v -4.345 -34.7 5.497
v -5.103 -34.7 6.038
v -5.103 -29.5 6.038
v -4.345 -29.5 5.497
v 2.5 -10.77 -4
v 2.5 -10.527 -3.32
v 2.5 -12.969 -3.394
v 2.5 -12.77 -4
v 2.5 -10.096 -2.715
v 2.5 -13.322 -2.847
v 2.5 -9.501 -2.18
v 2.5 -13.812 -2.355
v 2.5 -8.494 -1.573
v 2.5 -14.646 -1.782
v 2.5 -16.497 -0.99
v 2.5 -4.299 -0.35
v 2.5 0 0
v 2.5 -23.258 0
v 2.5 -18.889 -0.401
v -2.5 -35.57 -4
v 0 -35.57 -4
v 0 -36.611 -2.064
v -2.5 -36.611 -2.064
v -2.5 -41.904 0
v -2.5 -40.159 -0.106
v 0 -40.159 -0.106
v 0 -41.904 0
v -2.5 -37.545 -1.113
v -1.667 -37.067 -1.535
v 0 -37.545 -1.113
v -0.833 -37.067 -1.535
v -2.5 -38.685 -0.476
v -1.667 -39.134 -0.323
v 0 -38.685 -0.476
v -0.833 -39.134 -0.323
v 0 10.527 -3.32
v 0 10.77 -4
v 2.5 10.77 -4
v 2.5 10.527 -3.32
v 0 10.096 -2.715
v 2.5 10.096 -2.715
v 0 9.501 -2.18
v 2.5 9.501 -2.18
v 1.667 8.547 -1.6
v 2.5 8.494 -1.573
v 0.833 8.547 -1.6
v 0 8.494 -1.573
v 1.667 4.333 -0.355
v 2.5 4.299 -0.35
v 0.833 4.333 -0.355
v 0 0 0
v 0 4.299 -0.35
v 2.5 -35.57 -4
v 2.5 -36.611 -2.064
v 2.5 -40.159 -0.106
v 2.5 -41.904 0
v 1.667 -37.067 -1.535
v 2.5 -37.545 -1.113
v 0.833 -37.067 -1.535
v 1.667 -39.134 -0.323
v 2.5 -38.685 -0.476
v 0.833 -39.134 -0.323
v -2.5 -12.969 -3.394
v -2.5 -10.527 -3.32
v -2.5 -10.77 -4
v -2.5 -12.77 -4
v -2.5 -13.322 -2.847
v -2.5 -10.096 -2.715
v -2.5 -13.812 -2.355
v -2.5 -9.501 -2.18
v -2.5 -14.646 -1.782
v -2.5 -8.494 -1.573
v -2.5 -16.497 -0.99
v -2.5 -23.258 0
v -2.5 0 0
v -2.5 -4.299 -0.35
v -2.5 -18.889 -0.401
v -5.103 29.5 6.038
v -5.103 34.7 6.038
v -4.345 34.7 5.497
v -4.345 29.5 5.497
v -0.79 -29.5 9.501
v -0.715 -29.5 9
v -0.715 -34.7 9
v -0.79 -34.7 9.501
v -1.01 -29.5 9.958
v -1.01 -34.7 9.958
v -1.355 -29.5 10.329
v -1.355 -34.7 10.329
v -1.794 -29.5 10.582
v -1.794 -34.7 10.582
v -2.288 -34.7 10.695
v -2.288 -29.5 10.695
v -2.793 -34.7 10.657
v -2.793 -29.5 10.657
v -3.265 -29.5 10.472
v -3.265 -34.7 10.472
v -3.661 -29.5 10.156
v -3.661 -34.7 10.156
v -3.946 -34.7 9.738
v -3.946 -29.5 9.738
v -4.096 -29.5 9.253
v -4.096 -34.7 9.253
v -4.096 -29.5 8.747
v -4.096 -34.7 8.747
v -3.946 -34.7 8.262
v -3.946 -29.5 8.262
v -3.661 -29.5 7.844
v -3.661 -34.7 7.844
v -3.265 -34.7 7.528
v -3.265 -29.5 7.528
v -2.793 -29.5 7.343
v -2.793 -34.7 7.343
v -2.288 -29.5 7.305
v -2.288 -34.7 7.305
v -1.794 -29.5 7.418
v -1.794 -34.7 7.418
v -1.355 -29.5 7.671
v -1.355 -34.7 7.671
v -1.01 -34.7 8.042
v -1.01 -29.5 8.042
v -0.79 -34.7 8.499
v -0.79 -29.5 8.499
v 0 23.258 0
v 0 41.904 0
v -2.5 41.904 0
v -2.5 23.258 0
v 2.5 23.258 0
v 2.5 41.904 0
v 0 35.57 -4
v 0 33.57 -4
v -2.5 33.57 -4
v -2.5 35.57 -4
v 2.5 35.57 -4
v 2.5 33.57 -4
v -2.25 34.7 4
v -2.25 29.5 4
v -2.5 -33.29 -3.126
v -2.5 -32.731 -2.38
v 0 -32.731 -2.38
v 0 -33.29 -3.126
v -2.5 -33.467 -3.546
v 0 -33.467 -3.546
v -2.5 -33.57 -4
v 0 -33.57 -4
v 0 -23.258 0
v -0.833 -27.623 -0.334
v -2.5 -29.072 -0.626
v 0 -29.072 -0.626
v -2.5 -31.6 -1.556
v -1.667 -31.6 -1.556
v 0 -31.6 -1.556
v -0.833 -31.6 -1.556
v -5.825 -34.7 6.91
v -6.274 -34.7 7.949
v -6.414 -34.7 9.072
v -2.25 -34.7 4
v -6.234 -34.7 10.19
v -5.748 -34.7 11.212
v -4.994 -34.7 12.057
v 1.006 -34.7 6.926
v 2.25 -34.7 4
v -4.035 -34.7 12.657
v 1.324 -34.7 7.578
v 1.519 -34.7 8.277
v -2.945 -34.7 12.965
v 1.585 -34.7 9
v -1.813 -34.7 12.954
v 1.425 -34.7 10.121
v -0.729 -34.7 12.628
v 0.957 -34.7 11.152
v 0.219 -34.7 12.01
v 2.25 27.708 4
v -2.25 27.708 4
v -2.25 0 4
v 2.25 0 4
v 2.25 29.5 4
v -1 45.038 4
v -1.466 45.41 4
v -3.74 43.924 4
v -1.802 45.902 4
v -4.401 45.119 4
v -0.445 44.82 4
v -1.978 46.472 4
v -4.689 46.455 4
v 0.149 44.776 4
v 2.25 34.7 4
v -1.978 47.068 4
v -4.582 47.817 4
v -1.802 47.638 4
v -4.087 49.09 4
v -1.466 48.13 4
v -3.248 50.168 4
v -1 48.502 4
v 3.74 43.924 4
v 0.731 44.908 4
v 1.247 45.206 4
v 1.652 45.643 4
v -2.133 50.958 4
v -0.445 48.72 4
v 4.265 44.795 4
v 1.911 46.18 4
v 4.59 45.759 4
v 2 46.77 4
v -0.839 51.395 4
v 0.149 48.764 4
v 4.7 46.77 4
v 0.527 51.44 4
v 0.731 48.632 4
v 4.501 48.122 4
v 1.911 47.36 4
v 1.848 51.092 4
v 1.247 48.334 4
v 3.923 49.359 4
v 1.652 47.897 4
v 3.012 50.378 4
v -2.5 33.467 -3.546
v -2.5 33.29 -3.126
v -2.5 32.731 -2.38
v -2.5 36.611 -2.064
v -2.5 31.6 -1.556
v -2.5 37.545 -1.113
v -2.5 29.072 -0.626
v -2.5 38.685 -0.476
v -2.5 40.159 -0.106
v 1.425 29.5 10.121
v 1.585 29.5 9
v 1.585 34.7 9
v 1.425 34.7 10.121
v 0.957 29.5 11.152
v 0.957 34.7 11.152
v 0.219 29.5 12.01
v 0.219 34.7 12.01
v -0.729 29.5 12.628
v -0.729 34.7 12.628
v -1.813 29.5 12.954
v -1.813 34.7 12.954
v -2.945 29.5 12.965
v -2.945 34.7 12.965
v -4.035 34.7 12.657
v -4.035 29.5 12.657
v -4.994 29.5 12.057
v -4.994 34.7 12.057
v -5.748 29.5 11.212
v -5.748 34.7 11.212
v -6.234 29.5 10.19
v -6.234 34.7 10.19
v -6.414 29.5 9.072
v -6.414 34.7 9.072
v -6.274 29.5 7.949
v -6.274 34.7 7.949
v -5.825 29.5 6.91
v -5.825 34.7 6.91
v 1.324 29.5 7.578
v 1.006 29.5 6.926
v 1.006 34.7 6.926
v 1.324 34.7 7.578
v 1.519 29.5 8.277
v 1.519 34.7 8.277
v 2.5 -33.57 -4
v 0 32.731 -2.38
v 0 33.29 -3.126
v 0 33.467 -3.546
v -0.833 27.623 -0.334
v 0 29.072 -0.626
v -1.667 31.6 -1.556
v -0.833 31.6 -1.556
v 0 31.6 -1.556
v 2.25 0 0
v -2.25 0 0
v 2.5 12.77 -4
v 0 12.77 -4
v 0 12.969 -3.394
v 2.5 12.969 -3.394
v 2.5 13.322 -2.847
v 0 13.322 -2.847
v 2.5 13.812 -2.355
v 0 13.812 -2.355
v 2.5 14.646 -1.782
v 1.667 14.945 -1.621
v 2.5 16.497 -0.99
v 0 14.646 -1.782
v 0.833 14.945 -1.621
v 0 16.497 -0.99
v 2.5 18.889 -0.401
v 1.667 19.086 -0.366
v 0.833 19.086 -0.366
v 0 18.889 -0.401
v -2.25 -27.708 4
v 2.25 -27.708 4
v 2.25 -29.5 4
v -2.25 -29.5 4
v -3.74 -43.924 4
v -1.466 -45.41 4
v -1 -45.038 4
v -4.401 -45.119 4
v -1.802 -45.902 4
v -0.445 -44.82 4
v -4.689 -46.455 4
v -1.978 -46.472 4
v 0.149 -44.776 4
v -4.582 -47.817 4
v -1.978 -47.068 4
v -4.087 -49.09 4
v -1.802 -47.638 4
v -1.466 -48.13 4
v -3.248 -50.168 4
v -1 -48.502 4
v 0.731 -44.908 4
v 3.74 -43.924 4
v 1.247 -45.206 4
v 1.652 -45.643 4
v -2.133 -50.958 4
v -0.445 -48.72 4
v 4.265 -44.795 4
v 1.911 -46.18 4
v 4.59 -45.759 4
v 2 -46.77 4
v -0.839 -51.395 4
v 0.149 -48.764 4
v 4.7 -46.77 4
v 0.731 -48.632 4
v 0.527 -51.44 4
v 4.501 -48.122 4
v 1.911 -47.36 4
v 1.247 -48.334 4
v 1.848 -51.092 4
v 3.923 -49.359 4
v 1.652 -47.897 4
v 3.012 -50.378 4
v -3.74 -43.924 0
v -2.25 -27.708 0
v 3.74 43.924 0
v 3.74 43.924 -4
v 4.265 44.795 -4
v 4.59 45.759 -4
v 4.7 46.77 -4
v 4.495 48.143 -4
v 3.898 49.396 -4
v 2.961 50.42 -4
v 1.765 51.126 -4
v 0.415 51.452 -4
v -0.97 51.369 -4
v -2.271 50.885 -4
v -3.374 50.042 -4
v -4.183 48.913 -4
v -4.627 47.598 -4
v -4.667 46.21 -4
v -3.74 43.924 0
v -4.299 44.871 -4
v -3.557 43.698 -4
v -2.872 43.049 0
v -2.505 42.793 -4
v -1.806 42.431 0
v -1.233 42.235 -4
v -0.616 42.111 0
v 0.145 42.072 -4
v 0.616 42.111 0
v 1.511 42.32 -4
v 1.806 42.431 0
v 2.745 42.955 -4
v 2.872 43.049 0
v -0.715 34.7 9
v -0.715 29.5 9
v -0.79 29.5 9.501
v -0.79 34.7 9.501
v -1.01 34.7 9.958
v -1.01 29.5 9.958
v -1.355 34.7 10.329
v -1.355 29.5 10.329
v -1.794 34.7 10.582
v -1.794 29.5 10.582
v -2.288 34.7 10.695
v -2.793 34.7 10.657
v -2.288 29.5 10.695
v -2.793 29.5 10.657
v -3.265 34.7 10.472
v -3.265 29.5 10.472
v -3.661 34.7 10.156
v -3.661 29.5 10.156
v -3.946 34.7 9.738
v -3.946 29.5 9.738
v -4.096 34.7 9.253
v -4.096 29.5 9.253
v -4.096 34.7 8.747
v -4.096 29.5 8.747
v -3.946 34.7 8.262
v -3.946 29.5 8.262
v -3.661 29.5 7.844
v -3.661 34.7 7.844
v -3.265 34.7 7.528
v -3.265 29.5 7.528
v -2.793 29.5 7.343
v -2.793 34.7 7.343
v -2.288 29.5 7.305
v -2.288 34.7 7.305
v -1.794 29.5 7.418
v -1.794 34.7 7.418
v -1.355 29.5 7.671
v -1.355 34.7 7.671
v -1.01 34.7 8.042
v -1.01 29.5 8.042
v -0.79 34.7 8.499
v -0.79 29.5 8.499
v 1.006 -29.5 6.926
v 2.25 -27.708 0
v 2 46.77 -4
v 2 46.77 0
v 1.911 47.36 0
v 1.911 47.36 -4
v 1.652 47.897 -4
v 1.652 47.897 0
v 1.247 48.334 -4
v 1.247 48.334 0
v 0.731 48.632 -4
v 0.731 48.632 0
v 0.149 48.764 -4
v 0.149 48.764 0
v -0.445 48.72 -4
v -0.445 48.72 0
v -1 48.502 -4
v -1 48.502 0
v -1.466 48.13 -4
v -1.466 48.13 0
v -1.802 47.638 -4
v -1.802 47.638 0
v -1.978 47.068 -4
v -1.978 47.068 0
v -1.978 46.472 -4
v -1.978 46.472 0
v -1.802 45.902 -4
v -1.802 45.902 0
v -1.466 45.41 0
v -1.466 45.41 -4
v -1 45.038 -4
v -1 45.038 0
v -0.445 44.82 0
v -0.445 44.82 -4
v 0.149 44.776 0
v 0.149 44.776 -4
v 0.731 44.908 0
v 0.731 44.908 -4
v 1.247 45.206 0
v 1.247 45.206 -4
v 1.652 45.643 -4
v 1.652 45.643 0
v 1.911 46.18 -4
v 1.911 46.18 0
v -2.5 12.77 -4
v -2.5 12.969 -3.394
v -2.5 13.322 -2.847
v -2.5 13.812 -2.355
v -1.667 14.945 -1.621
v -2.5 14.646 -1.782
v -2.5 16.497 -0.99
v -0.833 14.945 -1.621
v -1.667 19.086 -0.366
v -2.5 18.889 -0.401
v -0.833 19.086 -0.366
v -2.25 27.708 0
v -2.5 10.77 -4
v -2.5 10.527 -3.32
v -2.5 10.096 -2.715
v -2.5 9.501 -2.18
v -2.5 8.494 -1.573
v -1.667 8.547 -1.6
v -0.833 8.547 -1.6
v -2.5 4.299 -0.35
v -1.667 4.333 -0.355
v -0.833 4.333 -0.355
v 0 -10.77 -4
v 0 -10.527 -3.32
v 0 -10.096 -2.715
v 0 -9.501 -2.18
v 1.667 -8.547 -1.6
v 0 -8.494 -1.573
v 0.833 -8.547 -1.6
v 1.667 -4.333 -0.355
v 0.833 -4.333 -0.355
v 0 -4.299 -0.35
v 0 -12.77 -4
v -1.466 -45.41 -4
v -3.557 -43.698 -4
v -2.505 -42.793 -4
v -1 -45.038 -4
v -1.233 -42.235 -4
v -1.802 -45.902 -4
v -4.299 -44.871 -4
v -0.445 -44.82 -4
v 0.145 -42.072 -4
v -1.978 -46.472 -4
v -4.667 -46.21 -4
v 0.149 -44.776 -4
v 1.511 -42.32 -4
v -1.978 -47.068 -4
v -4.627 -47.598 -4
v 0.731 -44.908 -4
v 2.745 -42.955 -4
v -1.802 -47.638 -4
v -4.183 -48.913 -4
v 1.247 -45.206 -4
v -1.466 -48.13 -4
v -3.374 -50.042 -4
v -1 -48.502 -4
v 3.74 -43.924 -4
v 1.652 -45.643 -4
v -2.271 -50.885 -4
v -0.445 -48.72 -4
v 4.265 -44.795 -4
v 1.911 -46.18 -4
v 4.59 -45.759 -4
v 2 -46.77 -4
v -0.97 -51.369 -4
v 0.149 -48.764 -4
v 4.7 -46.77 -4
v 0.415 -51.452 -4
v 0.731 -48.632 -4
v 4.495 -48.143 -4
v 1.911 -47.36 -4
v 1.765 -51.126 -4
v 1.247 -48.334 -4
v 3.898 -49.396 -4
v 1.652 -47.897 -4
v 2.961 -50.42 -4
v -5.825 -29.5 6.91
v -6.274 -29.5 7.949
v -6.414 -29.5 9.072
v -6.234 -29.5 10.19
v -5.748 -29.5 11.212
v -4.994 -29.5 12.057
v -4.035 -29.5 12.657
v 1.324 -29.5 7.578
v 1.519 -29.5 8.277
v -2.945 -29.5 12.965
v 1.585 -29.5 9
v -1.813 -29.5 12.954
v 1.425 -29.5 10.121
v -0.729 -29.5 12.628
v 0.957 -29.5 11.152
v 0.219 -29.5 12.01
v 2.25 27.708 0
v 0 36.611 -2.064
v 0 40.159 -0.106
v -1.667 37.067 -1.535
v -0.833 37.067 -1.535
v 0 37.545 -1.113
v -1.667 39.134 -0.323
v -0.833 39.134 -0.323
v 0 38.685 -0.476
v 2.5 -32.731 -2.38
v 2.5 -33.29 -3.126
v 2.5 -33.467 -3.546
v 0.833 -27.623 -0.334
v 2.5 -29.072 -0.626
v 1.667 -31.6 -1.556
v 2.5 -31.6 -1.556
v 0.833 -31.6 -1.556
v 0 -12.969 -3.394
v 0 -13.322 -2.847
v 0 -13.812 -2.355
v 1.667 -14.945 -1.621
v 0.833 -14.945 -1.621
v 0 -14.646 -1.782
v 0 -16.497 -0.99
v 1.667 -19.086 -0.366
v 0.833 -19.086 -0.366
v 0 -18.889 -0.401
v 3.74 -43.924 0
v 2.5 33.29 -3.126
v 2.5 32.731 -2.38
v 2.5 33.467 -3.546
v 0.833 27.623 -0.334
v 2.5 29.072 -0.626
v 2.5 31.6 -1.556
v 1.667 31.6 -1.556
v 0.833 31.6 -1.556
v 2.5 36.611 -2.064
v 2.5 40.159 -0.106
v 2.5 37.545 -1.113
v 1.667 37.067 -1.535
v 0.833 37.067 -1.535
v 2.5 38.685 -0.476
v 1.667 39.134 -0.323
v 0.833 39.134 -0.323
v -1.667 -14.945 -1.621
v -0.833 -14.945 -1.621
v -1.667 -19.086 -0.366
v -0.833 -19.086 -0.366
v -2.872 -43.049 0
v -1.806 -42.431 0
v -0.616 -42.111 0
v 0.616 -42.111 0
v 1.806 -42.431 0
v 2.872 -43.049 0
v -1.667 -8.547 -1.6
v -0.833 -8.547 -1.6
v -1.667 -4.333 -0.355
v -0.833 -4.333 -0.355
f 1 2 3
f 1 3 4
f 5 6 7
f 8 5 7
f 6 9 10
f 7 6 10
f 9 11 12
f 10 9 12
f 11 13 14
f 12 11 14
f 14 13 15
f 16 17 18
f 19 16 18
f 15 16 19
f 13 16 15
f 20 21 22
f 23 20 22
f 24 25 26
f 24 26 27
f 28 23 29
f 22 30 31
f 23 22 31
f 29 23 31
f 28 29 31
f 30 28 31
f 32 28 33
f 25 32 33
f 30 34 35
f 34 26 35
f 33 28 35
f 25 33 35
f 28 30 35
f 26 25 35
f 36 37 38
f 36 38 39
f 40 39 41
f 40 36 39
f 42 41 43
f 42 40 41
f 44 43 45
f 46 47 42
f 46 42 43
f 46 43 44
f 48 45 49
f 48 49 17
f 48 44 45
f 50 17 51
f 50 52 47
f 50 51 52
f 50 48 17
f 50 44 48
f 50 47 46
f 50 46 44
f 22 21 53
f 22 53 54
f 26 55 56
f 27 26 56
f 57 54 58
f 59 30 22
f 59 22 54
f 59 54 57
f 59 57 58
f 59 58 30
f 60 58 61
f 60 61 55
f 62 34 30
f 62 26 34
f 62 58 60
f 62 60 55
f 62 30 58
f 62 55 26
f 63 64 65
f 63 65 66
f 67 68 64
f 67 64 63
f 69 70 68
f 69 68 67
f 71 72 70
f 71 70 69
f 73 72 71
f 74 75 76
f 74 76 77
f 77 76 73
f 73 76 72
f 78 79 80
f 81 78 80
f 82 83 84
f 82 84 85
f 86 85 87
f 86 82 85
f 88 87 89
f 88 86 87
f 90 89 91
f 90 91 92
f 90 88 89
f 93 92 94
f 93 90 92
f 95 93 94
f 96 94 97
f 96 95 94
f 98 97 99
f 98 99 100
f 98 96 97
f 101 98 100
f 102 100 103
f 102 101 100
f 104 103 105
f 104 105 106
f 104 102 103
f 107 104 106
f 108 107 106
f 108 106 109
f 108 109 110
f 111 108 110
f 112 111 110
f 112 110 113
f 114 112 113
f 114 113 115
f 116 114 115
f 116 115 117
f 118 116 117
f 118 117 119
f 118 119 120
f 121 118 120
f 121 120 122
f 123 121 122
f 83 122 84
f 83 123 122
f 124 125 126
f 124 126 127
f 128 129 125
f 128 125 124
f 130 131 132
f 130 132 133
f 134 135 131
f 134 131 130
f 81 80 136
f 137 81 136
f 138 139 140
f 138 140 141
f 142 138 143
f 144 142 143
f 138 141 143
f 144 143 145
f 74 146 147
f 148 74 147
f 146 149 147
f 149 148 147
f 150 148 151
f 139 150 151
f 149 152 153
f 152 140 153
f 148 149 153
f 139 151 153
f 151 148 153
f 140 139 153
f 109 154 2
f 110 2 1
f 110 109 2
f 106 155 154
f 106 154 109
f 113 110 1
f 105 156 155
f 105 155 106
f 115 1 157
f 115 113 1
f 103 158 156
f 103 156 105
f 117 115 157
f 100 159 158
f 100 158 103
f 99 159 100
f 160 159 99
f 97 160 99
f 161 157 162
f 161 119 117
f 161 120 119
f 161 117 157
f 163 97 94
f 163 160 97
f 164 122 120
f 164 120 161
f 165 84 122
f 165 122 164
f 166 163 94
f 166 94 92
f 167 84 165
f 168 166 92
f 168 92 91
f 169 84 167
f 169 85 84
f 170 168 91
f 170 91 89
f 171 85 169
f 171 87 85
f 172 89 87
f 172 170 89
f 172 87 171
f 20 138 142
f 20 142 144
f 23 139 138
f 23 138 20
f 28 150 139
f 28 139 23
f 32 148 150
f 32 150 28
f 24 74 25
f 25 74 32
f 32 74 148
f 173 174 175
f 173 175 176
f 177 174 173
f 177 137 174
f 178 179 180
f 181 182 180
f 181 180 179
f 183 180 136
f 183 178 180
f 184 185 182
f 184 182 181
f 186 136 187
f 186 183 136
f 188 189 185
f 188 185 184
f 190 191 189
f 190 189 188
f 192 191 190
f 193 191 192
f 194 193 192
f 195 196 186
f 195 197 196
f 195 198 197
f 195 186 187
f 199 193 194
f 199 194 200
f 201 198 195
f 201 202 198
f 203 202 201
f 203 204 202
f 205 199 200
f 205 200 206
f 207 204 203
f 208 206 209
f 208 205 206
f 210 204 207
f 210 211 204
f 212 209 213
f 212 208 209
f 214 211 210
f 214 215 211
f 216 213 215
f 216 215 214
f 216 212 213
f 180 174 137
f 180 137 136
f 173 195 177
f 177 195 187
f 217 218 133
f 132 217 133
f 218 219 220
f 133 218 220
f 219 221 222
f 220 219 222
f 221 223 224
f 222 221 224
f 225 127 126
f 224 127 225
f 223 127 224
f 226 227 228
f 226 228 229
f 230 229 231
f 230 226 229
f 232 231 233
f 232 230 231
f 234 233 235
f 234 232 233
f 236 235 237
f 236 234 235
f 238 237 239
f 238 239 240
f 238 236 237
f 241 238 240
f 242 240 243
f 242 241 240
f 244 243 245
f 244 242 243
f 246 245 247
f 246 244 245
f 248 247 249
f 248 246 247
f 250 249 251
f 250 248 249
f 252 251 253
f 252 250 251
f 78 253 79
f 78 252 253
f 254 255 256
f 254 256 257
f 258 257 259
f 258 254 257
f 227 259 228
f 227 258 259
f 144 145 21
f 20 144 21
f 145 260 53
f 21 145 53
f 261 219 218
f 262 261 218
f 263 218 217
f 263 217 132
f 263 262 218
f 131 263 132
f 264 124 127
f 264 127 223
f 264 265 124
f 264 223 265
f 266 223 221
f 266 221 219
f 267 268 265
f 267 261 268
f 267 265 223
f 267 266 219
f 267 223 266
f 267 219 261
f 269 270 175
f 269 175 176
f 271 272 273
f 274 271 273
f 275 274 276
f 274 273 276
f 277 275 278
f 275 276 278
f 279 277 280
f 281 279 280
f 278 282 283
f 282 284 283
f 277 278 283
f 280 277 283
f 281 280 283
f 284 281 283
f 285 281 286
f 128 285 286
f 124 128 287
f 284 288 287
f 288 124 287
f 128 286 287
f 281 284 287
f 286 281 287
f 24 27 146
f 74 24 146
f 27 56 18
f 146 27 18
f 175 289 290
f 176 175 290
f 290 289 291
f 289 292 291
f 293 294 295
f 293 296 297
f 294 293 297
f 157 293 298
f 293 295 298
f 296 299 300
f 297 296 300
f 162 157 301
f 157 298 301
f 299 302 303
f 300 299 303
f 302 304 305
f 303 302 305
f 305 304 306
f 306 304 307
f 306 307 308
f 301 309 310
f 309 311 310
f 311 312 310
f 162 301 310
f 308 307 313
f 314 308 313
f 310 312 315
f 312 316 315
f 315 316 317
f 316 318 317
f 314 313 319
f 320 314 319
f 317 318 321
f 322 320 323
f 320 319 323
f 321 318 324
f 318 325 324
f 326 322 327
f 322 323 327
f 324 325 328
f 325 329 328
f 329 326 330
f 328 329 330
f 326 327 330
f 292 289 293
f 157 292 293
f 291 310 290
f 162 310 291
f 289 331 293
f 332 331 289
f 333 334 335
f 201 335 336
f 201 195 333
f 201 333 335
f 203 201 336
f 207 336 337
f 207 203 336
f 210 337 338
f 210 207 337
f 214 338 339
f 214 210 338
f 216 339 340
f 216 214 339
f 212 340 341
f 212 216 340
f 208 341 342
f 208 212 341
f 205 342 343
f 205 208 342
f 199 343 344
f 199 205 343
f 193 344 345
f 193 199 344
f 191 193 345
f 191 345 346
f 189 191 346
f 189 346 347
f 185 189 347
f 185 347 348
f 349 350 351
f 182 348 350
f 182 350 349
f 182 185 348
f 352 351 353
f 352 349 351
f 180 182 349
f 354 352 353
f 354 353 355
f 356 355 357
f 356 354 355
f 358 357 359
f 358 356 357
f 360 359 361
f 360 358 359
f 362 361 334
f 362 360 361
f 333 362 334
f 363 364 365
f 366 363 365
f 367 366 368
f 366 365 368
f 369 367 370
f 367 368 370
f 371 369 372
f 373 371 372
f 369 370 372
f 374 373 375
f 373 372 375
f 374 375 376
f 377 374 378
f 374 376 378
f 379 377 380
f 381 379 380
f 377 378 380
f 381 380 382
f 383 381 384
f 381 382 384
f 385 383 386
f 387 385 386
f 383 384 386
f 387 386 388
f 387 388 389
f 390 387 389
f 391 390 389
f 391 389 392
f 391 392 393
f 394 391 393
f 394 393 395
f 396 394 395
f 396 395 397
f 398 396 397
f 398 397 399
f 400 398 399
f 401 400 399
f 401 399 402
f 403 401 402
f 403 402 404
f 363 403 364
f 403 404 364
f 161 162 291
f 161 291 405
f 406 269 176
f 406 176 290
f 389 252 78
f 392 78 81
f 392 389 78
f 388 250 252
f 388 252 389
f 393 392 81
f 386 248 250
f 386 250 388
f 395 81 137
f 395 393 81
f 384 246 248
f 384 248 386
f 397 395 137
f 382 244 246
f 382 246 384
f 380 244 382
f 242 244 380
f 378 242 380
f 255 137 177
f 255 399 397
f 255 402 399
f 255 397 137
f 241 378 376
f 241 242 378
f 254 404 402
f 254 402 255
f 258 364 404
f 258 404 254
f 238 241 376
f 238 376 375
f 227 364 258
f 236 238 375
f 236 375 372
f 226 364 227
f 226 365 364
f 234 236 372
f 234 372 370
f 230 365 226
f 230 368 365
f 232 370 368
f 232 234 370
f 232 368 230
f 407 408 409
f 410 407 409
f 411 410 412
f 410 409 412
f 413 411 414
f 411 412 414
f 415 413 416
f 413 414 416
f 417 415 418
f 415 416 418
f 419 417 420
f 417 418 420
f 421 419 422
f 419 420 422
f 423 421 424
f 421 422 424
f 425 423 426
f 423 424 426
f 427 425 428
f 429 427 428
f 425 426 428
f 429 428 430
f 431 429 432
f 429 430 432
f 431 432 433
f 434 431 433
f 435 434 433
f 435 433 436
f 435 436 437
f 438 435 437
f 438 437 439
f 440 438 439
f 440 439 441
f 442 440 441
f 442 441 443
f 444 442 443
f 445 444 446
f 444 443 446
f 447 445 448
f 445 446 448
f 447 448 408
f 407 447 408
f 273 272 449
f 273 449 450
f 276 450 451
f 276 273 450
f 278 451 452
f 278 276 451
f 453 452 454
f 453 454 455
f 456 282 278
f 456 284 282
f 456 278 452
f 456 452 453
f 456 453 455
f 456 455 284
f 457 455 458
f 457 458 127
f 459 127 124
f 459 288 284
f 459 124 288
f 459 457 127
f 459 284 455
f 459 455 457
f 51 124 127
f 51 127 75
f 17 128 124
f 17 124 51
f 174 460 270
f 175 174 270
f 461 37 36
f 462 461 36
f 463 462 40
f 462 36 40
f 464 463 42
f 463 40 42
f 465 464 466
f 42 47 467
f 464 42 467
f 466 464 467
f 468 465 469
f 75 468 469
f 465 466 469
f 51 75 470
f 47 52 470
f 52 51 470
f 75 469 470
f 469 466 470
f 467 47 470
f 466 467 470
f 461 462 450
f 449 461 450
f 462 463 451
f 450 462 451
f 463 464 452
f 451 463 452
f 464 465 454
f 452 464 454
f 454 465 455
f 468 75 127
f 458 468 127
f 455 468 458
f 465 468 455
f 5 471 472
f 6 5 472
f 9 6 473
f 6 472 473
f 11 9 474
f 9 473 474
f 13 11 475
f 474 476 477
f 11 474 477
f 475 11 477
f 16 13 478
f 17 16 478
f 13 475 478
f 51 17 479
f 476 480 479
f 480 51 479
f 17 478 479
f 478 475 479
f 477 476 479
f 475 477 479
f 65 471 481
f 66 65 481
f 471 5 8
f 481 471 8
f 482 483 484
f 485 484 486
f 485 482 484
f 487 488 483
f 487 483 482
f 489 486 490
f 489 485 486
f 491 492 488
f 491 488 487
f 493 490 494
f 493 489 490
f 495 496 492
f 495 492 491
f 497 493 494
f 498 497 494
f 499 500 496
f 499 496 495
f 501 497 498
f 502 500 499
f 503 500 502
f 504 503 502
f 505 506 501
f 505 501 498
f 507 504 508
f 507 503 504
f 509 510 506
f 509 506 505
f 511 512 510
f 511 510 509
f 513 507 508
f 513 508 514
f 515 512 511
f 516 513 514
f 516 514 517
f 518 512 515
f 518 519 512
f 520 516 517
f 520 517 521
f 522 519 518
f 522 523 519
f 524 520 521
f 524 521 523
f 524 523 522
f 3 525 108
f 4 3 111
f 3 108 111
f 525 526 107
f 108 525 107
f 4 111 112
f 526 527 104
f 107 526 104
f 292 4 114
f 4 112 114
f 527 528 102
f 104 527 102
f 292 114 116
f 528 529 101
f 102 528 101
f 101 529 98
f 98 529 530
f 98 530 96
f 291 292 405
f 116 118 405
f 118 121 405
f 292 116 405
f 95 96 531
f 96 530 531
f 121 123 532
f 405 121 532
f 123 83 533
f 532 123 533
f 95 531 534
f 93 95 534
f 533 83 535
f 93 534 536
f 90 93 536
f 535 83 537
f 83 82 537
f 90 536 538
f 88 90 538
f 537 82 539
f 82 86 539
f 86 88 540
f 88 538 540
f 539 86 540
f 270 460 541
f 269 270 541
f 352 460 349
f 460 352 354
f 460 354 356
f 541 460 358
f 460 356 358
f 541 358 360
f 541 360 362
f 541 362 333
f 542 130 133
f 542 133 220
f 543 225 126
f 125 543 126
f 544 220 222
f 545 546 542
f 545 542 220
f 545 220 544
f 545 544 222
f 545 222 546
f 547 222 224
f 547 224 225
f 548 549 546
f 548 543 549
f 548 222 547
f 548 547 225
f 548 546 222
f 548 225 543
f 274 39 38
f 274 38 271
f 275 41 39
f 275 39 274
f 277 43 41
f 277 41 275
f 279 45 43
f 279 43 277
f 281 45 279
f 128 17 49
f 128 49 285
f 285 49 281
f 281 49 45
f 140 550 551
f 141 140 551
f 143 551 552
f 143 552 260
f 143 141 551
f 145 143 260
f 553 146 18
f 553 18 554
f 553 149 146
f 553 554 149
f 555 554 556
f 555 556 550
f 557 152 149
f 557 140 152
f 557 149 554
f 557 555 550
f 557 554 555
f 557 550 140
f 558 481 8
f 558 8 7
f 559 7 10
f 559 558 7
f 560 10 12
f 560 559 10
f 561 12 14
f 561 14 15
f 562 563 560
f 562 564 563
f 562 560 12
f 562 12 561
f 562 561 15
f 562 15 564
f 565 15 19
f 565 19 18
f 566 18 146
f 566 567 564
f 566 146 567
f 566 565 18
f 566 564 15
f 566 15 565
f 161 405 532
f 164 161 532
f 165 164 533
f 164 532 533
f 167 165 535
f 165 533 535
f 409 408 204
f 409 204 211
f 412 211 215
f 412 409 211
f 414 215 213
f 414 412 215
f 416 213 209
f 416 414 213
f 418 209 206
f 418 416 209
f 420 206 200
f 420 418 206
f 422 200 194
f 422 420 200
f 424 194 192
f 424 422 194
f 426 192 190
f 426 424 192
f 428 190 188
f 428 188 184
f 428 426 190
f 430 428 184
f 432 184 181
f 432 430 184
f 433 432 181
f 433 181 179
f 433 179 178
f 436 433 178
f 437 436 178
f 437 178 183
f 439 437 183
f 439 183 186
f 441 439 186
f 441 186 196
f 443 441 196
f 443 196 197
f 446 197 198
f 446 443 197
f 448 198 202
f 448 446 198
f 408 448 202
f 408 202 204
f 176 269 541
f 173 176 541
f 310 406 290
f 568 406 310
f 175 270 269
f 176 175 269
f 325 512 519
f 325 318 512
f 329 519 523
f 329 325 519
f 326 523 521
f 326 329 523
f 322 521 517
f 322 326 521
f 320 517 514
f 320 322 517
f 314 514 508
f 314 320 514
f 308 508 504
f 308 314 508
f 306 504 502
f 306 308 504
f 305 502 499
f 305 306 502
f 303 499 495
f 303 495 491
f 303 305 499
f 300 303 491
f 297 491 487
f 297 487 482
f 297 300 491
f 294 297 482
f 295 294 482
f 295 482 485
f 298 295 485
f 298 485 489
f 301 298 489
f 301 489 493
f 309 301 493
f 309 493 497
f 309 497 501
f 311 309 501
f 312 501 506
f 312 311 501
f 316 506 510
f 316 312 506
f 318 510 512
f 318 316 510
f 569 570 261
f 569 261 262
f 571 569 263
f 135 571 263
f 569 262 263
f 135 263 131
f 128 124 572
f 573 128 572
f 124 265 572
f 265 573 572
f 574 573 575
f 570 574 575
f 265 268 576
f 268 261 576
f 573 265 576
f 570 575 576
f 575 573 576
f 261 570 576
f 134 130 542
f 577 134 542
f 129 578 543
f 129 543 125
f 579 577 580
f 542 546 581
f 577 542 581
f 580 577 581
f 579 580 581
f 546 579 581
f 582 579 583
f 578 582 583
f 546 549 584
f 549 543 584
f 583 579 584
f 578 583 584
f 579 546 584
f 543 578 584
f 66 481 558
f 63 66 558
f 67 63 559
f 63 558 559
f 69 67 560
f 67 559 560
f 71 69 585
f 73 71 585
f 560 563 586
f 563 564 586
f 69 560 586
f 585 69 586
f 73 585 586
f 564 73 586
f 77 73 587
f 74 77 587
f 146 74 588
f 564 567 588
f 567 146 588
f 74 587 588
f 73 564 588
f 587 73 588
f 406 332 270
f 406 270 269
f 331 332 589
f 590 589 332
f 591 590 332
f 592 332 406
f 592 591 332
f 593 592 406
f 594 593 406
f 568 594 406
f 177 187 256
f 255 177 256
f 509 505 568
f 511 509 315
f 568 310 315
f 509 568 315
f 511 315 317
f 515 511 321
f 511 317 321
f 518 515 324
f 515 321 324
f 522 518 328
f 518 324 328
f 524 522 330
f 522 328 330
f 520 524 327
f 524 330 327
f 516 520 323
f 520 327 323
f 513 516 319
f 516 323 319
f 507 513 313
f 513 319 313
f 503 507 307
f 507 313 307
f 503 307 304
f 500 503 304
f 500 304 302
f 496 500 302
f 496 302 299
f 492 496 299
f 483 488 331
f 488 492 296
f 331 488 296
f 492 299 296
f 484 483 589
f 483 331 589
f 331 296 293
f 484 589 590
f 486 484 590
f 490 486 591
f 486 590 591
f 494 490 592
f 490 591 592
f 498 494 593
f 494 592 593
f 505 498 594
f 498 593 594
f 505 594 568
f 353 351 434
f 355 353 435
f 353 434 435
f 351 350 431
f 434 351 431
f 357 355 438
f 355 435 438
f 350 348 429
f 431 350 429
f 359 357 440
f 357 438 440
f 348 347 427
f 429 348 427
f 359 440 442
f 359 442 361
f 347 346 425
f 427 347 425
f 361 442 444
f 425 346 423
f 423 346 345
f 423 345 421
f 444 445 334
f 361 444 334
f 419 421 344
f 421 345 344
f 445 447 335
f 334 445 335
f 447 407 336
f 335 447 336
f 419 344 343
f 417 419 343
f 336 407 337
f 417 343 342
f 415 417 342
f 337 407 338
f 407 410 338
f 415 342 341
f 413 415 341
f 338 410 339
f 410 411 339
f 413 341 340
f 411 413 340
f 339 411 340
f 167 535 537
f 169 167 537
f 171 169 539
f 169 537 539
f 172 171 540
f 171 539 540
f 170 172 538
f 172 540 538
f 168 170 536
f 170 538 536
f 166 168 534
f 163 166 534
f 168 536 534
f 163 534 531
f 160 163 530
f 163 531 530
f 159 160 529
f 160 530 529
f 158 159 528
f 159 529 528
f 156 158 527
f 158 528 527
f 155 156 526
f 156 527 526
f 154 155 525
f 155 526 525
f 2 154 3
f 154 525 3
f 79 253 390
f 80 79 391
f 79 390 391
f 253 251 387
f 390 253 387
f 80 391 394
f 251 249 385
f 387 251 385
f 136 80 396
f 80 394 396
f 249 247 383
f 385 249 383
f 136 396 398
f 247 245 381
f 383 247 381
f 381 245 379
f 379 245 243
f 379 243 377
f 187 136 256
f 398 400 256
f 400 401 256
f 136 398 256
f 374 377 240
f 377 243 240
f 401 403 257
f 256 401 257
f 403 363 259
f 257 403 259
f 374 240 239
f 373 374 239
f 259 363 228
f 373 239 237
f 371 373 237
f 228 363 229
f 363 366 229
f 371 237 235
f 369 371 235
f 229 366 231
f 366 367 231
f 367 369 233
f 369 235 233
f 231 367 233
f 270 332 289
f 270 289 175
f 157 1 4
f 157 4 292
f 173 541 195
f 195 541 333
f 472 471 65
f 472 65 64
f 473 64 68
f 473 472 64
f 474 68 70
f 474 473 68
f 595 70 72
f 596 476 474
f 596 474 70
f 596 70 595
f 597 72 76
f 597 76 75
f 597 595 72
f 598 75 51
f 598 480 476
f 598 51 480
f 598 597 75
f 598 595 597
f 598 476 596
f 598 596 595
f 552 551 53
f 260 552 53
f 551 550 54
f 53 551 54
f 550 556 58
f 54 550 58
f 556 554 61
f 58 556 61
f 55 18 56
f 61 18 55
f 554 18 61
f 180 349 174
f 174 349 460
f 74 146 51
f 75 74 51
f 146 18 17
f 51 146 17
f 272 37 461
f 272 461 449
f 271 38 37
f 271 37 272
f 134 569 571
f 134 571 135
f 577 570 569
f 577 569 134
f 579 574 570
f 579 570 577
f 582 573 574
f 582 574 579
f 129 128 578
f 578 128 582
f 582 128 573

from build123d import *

# Parameters (mm, degrees)
F0_R     = 2
F1_DEPTH = 4
F3_START = -29.5
F2_R     = 1.7
F3_DEPTH = 5.2
F4_DEPTH = 4
F6_DEPTH = 2.5


# Not quite as in the source:
# - a feature names something its author has since deleted; it is built from what else it names


with BuildPart() as f1:
    # F0 (on Top) → F1 (new body)
    with BuildSketch(Plane.XY):
        with BuildLine():
            ThreePointArc((3.7401051407, 43.9236666505), (0, 42.07), (-3.7401051407, 43.9236666505))
            Line((-3.7401051407, 43.9236666505), (-2.25, 27.707760334))
            Line((-2.25, 27.707760334), (-2.25, 0))
            Line((-2.25, 0), (0, 0))
            Line((0, 0), (2.25, 0))
            Line((2.25, 0), (2.25, 27.707760334))
            Line((2.25, 27.707760334), (3.7401051407, 43.9236666505))
        make_face()
        with BuildLine():
            ThreePointArc((3.7401051407, 43.9236666505), (4.4535656592, 45.2680835845), (4.7, 46.77))
            ThreePointArc((4.7, 46.77), (-1.5019164155, 51.2235656592), (-3.7401051407, 43.9236666505))
            ThreePointArc((-3.7401051407, 43.9236666505), (0, 42.07), (3.7401051407, 43.9236666505))
        make_face()
        with Locations((0, 46.77)):
            Circle(F0_R, mode=Mode.SUBTRACT)
    extrude(amount=F1_DEPTH)

    # F2 (on Front) → F3 (join)
    with BuildSketch(Plane.XZ.offset(F3_START)):
        with BuildLine():
            Line((2.25, 4), (1.0056584573, 6.9262712577))
            ThreePointArc((1.0056584573, 6.9262712577), (-1.3823144995, 5.1355544295), (-4.3452027561, 5.4966289094))
            Line((-4.3452027561, 5.4966289094), (-2.25, 4))
            Line((-2.25, 4), (2.25, 4))
        make_face()
        with BuildLine():
            ThreePointArc((1.0056584573, 6.9262712577), (1.4375788293, 7.9234081388), (1.5851834752, 9))
            ThreePointArc((1.5851834752, 9), (-4.0346730574, 12.657330285), (-5.1028489317, 6.037824823))
            Line((-5.1028489317, 6.037824823), (-4.3452027561, 5.4966289094))
            ThreePointArc((-4.3452027561, 5.4966289094), (-1.3823144995, 5.1355544295), (1.0056584573, 6.9262712577))
        make_face()
        with Locations((-2.4148165248, 9)):
            Circle(F2_R, mode=Mode.SUBTRACT)
    extrude(amount=-F3_DEPTH)

    # F0 (on Top) → F4 (join)
    with BuildSketch(Plane.XY):
        with BuildLine():
            ThreePointArc((3.7401051407, 43.9236666505), (4.4535656592, 45.2680835845), (4.7, 46.77))
            ThreePointArc((4.7, 46.77), (-1.5019164155, 51.2235656592), (-3.7401051407, 43.9236666505))
            ThreePointArc((-3.7401051407, 43.9236666505), (0, 42.07), (3.7401051407, 43.9236666505))
        make_face()
        with Locations((0, 46.77)):
            Circle(F0_R, mode=Mode.SUBTRACT)
    extrude(amount=-F4_DEPTH)


with BuildPart() as f6:
    # F5 (on Right) → F6 (new body, symmetric)
    with BuildSketch(Plane.YZ):
        with BuildLine():
            Line((41.9037155807, 0), (35.57, 0))
            Line((35.57, 0), (35.57, -4))
            add(Edge.make_bspline(
                [(35.57, -4), (36.8272326887, -0.7868814864), (38.7368577904, 0), (41.9037155807, 0)],
                knots=[0, 0, 0, 0, 7.4910582068, 7.4910582068, 7.4910582068, 7.4910582068], degree=3))
        make_face()
        with BuildLine():
            Line((35.57, -4), (35.57, 0))
            Line((35.57, 0), (23.2577491552, 0))
            add(Edge.make_bspline(
                [(23.2577491552, 0), (27.2780284286, 0), (33.1432744861, -0.8353546145), (33.57, -4)],
                knots=[0, 0, 0, 0, 11.0608551879, 11.0608551879, 11.0608551879, 11.0608551879], degree=3))
            Line((33.57, -4), (35.57, -4))
        make_face()
    extrude(amount=F6_DEPTH, both=True)


with BuildPart() as f6b:
    # F5 (on Right) → F6, piece 2 (new body, symmetric)
    with BuildSketch(Plane.YZ):
        with BuildLine():
            add(Edge.make_bspline(
                [(12.77, -4), (13.317771256, -0.9807739407), (19.7162237018, 0), (23.2577491552, 0)],
                knots=[0, 0, 0, 0, 11.2246551101, 11.2246551101, 11.2246551101, 11.2246551101], degree=3))
            Line((23.2577491552, 0), (0, 0))
            add(Edge.make_bspline(
                [(10.77, -4), (10.1670185104, -0.9323008708), (3.7685674615, 0), (0, 0)],
                knots=[0, 0, 0, 0, 11.4888163011, 11.4888163011, 11.4888163011, 11.4888163011], degree=3))
            Line((10.77, -4), (12.77, -4))
        make_face()
    extrude(amount=F6_DEPTH, both=True)


with BuildPart() as f7_1:
    # F7: instance of F1
    add(f1.part.mirror(Plane(origin=(0, 0, 2), x_dir=(1, 0, 0), z_dir=(0, -1, 0))))


with BuildPart() as f7_2:
    # F7: instance of F6
    add(f6.part.mirror(Plane(origin=(0, 0, 2), x_dir=(1, 0, 0), z_dir=(0, -1, 0))))


with BuildPart() as f7_3:
    # F7: instance of F6b
    add(f6b.part.mirror(Plane(origin=(0, 0, 2), x_dir=(1, 0, 0), z_dir=(0, -1, 0))))


solid = Compound([f1.part, f6.part, f6b.part, f7_1.part, f7_2.part, f7_3.part])
